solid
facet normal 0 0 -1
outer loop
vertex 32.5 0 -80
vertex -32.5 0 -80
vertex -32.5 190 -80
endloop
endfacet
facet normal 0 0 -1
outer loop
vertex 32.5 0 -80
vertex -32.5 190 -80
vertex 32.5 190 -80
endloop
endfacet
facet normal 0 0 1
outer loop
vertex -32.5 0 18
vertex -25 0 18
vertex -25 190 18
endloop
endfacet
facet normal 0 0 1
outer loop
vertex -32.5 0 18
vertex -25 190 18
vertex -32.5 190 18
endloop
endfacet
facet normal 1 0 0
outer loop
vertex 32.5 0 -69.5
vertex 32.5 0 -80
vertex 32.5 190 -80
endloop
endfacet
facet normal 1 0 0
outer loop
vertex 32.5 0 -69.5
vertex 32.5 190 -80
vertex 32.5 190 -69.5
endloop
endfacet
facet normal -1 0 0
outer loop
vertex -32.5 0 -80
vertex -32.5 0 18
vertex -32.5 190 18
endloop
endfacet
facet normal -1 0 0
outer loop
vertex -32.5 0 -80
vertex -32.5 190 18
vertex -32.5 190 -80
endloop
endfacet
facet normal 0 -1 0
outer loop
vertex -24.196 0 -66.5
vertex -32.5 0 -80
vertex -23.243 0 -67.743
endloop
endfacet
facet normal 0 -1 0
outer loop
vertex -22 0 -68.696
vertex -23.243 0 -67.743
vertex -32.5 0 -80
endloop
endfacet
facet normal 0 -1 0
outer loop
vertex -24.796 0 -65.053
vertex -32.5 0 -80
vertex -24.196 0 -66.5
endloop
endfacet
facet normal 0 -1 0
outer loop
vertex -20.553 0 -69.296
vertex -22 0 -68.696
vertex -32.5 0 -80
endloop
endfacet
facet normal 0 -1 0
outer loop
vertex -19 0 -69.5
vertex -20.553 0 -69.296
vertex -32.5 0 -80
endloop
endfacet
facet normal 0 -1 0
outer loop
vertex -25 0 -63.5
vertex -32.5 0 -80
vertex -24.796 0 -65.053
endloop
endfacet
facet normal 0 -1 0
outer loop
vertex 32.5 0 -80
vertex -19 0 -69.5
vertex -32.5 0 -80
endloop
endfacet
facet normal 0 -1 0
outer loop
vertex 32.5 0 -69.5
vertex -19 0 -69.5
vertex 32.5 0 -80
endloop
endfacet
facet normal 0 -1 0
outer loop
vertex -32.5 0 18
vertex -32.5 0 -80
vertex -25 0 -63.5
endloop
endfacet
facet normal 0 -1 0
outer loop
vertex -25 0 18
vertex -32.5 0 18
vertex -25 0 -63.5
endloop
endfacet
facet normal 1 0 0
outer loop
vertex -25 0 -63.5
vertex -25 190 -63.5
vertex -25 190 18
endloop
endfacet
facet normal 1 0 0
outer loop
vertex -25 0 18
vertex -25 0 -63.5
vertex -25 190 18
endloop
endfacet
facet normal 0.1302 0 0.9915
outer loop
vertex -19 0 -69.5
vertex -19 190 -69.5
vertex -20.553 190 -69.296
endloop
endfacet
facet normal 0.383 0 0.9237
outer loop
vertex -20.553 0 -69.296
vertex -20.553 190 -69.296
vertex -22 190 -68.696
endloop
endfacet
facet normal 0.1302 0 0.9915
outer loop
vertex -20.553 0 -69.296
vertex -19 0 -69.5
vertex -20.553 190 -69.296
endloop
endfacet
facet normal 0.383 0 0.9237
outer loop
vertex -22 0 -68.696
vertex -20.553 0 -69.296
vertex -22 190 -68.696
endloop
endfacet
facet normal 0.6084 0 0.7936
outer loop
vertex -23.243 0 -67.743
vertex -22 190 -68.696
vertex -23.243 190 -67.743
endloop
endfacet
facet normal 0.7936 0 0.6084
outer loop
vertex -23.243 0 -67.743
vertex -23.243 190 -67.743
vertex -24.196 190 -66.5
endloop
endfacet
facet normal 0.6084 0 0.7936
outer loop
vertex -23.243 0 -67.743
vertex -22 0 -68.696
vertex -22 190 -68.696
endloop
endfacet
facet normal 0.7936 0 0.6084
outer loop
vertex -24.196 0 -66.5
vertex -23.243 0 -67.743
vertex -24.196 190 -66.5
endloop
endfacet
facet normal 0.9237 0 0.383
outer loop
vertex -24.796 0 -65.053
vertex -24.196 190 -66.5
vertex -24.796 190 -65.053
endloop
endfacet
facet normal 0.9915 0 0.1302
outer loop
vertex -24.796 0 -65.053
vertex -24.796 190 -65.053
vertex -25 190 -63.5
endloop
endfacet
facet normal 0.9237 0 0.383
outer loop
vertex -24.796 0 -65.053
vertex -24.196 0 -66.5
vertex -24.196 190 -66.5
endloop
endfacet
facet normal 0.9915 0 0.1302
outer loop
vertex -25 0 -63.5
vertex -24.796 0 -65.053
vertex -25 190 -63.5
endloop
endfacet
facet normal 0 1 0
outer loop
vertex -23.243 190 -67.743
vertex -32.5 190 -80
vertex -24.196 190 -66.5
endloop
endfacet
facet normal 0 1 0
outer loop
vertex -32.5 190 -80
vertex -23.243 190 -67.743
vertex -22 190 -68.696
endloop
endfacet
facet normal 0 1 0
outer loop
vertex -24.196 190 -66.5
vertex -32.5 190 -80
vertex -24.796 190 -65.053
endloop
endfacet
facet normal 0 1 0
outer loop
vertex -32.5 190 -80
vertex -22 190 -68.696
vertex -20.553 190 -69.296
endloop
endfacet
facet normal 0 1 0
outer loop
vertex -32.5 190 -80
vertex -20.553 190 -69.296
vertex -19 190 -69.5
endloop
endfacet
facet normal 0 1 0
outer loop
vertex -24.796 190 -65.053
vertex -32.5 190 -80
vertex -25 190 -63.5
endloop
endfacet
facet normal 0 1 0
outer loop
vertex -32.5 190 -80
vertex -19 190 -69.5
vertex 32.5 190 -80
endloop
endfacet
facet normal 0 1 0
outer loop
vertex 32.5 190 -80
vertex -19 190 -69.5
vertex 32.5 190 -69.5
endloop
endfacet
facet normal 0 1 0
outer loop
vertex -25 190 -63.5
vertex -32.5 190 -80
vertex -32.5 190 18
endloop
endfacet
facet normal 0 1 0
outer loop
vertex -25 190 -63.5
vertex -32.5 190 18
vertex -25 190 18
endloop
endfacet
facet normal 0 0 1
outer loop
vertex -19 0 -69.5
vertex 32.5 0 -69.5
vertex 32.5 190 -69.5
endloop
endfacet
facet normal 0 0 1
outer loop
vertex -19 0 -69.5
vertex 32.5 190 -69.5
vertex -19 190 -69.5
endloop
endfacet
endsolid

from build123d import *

# Parameters (mm, degrees)
F1_DEPTH = 190


# Not quite as in the source:
# - a feature names something its author has since deleted; it is built from what else it names


with BuildPart() as f1:
    # F0 (on Front) → F1 (new body)
    with BuildSketch(Plane.XZ):
        with BuildLine():
            Line((-32.5, -80), (32.5, -80))
            Line((32.5, -80), (32.5, -69.5))
            Line((32.5, -69.5), (-19, -69.5))
            ThreePointArc((-19, -69.5), (-23.2426406871, -67.7426406871), (-25, -63.5))
            Line((-25, -63.5), (-25, 18))
            Line((-25, 18), (-32.5, 18))
            Line((-32.5, 18), (-32.5, -80))
        make_face()
    extrude(amount=-F1_DEPTH)


solid = f1.part
